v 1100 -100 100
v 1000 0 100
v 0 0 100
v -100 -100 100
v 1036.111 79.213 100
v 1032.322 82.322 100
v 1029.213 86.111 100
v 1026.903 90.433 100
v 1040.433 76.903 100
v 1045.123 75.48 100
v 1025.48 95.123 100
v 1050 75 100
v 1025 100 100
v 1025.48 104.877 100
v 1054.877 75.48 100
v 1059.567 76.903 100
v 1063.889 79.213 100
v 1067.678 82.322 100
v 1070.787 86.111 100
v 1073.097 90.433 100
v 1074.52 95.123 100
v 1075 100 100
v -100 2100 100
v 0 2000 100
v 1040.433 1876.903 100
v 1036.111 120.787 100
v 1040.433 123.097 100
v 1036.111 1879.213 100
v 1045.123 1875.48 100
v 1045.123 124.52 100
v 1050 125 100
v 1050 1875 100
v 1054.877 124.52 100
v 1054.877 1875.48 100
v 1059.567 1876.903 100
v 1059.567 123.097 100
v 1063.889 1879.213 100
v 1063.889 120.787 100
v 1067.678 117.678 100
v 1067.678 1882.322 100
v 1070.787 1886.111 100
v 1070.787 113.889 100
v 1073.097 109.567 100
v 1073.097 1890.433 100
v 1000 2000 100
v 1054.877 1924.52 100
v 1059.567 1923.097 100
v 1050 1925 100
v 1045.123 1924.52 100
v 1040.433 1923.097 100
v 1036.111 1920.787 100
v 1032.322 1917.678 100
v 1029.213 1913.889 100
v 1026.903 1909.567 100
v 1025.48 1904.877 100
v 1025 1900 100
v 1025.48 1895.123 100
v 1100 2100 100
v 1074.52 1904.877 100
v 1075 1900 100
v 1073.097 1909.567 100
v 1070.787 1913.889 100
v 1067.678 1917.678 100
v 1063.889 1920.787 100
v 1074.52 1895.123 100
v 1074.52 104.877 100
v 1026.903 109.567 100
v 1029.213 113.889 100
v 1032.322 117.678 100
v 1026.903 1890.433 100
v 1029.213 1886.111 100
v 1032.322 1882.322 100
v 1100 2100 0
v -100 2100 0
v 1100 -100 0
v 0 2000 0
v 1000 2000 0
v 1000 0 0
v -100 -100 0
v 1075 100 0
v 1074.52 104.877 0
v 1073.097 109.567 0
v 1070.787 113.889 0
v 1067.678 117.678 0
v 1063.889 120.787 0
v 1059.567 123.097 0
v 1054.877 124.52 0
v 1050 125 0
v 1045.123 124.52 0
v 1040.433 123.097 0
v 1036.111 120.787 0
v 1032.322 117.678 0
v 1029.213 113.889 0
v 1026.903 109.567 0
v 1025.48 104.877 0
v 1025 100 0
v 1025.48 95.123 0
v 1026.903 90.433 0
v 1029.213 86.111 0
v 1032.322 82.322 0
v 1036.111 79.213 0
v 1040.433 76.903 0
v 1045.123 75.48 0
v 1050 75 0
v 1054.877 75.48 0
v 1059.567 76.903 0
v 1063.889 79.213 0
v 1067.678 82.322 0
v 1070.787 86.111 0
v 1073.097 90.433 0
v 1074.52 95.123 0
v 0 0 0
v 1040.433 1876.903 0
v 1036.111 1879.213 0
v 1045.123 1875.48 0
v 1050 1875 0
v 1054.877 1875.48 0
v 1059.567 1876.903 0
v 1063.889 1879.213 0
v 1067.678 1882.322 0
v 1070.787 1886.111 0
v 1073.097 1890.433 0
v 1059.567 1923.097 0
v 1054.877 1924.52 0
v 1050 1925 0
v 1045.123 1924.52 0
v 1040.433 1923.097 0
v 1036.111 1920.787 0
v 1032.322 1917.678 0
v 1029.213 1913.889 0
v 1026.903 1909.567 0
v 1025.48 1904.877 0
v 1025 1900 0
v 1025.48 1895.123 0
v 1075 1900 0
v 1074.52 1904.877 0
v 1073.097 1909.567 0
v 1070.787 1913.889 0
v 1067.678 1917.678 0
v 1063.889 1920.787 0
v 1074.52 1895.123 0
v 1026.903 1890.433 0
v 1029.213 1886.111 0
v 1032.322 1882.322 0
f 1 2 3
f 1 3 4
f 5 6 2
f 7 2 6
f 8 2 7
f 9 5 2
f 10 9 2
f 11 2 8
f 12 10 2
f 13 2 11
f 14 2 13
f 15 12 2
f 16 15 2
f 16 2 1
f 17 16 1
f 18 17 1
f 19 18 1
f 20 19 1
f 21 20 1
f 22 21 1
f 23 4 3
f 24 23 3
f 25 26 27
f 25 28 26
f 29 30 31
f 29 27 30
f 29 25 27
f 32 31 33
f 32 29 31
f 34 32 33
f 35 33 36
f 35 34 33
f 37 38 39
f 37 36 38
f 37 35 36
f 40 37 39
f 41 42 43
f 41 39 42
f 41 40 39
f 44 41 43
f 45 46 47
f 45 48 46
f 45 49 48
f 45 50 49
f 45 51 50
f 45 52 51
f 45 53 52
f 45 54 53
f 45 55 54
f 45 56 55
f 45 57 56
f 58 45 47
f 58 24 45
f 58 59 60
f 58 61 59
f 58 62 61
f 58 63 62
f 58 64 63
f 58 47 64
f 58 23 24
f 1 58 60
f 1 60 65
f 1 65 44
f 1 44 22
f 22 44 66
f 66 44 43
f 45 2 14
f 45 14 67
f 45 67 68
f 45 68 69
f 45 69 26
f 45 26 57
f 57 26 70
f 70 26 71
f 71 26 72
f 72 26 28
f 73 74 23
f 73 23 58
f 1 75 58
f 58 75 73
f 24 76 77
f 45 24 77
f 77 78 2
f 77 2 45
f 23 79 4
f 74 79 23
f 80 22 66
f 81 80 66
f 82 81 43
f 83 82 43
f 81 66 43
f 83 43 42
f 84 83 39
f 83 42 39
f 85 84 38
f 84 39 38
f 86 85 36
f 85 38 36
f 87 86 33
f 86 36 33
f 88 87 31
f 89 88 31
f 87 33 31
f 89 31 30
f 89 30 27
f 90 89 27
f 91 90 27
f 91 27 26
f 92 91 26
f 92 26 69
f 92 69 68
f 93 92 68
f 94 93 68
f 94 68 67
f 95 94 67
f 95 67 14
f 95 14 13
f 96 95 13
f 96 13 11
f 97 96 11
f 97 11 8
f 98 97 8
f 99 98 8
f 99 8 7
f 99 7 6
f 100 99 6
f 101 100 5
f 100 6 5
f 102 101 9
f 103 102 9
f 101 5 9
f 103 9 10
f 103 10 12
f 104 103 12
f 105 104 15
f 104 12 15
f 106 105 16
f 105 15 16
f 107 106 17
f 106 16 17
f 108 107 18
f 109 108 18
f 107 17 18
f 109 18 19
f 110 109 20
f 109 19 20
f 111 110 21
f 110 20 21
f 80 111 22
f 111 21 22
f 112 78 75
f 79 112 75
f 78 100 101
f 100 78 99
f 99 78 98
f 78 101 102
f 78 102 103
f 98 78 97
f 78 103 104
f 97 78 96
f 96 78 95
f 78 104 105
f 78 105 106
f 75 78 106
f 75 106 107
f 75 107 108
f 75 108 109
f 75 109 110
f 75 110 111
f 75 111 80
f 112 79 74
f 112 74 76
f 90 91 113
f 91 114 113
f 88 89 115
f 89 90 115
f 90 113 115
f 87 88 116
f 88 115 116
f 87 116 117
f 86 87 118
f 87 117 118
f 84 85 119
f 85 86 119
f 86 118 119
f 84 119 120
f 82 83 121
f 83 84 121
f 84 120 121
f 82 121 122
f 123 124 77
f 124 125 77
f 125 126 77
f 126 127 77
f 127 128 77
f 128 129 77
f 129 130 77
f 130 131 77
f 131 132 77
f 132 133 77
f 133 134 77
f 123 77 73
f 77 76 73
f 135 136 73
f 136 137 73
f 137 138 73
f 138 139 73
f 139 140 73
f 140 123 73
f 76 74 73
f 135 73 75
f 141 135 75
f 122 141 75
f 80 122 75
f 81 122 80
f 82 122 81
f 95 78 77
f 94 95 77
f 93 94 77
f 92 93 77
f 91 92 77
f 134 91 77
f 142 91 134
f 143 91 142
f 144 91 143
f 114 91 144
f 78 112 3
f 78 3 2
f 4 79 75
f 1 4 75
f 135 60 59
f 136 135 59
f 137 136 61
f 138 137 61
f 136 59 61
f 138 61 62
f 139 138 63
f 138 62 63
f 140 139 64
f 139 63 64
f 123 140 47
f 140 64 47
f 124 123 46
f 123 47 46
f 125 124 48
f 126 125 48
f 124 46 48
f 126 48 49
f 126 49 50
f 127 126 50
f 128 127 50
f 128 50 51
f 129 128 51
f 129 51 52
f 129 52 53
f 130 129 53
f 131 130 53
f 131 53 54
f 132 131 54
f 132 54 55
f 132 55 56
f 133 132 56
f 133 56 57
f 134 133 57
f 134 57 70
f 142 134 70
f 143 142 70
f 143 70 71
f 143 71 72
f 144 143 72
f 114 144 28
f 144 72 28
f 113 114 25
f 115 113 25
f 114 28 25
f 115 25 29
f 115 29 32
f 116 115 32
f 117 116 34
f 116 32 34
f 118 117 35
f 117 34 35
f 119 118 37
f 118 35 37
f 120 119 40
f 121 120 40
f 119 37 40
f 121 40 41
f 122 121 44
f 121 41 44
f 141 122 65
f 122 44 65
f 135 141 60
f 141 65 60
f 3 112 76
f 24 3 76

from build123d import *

# Parameters (mm, degrees)
SKETCH1_W           = 1200
SKETCH1_H           = 2200
SKETCH1_W_2         = 1000
SKETCH1_H_2         = 2000
BOSS_EXTRUDE1_DEPTH = 100
SKETCH2_R           = 25
CUT_EXTRUDE1_DEPTH  = 2373.762103541


with BuildPart() as part:
    # Sketch1 → Boss-Extrude1 (new body)
    with BuildSketch(Plane.XY):
        with Locations((500, 1000)):
            Rectangle(SKETCH1_W, SKETCH1_H)
        with Locations((500, 1000)):
            Rectangle(SKETCH1_W_2, SKETCH1_H_2, mode=Mode.SUBTRACT)
    extrude(amount=BOSS_EXTRUDE1_DEPTH)

    # Sketch2 → Cut-Extrude1 (cut, through all)
    with BuildSketch(Plane.XY.offset(100)):
        with Locations((1050, 1900)):
            Circle(SKETCH2_R)
        with Locations((1050, 100)):
            Circle(SKETCH2_R)
    extrude(amount=-CUT_EXTRUDE1_DEPTH, mode=Mode.SUBTRACT)


solid = part.part
